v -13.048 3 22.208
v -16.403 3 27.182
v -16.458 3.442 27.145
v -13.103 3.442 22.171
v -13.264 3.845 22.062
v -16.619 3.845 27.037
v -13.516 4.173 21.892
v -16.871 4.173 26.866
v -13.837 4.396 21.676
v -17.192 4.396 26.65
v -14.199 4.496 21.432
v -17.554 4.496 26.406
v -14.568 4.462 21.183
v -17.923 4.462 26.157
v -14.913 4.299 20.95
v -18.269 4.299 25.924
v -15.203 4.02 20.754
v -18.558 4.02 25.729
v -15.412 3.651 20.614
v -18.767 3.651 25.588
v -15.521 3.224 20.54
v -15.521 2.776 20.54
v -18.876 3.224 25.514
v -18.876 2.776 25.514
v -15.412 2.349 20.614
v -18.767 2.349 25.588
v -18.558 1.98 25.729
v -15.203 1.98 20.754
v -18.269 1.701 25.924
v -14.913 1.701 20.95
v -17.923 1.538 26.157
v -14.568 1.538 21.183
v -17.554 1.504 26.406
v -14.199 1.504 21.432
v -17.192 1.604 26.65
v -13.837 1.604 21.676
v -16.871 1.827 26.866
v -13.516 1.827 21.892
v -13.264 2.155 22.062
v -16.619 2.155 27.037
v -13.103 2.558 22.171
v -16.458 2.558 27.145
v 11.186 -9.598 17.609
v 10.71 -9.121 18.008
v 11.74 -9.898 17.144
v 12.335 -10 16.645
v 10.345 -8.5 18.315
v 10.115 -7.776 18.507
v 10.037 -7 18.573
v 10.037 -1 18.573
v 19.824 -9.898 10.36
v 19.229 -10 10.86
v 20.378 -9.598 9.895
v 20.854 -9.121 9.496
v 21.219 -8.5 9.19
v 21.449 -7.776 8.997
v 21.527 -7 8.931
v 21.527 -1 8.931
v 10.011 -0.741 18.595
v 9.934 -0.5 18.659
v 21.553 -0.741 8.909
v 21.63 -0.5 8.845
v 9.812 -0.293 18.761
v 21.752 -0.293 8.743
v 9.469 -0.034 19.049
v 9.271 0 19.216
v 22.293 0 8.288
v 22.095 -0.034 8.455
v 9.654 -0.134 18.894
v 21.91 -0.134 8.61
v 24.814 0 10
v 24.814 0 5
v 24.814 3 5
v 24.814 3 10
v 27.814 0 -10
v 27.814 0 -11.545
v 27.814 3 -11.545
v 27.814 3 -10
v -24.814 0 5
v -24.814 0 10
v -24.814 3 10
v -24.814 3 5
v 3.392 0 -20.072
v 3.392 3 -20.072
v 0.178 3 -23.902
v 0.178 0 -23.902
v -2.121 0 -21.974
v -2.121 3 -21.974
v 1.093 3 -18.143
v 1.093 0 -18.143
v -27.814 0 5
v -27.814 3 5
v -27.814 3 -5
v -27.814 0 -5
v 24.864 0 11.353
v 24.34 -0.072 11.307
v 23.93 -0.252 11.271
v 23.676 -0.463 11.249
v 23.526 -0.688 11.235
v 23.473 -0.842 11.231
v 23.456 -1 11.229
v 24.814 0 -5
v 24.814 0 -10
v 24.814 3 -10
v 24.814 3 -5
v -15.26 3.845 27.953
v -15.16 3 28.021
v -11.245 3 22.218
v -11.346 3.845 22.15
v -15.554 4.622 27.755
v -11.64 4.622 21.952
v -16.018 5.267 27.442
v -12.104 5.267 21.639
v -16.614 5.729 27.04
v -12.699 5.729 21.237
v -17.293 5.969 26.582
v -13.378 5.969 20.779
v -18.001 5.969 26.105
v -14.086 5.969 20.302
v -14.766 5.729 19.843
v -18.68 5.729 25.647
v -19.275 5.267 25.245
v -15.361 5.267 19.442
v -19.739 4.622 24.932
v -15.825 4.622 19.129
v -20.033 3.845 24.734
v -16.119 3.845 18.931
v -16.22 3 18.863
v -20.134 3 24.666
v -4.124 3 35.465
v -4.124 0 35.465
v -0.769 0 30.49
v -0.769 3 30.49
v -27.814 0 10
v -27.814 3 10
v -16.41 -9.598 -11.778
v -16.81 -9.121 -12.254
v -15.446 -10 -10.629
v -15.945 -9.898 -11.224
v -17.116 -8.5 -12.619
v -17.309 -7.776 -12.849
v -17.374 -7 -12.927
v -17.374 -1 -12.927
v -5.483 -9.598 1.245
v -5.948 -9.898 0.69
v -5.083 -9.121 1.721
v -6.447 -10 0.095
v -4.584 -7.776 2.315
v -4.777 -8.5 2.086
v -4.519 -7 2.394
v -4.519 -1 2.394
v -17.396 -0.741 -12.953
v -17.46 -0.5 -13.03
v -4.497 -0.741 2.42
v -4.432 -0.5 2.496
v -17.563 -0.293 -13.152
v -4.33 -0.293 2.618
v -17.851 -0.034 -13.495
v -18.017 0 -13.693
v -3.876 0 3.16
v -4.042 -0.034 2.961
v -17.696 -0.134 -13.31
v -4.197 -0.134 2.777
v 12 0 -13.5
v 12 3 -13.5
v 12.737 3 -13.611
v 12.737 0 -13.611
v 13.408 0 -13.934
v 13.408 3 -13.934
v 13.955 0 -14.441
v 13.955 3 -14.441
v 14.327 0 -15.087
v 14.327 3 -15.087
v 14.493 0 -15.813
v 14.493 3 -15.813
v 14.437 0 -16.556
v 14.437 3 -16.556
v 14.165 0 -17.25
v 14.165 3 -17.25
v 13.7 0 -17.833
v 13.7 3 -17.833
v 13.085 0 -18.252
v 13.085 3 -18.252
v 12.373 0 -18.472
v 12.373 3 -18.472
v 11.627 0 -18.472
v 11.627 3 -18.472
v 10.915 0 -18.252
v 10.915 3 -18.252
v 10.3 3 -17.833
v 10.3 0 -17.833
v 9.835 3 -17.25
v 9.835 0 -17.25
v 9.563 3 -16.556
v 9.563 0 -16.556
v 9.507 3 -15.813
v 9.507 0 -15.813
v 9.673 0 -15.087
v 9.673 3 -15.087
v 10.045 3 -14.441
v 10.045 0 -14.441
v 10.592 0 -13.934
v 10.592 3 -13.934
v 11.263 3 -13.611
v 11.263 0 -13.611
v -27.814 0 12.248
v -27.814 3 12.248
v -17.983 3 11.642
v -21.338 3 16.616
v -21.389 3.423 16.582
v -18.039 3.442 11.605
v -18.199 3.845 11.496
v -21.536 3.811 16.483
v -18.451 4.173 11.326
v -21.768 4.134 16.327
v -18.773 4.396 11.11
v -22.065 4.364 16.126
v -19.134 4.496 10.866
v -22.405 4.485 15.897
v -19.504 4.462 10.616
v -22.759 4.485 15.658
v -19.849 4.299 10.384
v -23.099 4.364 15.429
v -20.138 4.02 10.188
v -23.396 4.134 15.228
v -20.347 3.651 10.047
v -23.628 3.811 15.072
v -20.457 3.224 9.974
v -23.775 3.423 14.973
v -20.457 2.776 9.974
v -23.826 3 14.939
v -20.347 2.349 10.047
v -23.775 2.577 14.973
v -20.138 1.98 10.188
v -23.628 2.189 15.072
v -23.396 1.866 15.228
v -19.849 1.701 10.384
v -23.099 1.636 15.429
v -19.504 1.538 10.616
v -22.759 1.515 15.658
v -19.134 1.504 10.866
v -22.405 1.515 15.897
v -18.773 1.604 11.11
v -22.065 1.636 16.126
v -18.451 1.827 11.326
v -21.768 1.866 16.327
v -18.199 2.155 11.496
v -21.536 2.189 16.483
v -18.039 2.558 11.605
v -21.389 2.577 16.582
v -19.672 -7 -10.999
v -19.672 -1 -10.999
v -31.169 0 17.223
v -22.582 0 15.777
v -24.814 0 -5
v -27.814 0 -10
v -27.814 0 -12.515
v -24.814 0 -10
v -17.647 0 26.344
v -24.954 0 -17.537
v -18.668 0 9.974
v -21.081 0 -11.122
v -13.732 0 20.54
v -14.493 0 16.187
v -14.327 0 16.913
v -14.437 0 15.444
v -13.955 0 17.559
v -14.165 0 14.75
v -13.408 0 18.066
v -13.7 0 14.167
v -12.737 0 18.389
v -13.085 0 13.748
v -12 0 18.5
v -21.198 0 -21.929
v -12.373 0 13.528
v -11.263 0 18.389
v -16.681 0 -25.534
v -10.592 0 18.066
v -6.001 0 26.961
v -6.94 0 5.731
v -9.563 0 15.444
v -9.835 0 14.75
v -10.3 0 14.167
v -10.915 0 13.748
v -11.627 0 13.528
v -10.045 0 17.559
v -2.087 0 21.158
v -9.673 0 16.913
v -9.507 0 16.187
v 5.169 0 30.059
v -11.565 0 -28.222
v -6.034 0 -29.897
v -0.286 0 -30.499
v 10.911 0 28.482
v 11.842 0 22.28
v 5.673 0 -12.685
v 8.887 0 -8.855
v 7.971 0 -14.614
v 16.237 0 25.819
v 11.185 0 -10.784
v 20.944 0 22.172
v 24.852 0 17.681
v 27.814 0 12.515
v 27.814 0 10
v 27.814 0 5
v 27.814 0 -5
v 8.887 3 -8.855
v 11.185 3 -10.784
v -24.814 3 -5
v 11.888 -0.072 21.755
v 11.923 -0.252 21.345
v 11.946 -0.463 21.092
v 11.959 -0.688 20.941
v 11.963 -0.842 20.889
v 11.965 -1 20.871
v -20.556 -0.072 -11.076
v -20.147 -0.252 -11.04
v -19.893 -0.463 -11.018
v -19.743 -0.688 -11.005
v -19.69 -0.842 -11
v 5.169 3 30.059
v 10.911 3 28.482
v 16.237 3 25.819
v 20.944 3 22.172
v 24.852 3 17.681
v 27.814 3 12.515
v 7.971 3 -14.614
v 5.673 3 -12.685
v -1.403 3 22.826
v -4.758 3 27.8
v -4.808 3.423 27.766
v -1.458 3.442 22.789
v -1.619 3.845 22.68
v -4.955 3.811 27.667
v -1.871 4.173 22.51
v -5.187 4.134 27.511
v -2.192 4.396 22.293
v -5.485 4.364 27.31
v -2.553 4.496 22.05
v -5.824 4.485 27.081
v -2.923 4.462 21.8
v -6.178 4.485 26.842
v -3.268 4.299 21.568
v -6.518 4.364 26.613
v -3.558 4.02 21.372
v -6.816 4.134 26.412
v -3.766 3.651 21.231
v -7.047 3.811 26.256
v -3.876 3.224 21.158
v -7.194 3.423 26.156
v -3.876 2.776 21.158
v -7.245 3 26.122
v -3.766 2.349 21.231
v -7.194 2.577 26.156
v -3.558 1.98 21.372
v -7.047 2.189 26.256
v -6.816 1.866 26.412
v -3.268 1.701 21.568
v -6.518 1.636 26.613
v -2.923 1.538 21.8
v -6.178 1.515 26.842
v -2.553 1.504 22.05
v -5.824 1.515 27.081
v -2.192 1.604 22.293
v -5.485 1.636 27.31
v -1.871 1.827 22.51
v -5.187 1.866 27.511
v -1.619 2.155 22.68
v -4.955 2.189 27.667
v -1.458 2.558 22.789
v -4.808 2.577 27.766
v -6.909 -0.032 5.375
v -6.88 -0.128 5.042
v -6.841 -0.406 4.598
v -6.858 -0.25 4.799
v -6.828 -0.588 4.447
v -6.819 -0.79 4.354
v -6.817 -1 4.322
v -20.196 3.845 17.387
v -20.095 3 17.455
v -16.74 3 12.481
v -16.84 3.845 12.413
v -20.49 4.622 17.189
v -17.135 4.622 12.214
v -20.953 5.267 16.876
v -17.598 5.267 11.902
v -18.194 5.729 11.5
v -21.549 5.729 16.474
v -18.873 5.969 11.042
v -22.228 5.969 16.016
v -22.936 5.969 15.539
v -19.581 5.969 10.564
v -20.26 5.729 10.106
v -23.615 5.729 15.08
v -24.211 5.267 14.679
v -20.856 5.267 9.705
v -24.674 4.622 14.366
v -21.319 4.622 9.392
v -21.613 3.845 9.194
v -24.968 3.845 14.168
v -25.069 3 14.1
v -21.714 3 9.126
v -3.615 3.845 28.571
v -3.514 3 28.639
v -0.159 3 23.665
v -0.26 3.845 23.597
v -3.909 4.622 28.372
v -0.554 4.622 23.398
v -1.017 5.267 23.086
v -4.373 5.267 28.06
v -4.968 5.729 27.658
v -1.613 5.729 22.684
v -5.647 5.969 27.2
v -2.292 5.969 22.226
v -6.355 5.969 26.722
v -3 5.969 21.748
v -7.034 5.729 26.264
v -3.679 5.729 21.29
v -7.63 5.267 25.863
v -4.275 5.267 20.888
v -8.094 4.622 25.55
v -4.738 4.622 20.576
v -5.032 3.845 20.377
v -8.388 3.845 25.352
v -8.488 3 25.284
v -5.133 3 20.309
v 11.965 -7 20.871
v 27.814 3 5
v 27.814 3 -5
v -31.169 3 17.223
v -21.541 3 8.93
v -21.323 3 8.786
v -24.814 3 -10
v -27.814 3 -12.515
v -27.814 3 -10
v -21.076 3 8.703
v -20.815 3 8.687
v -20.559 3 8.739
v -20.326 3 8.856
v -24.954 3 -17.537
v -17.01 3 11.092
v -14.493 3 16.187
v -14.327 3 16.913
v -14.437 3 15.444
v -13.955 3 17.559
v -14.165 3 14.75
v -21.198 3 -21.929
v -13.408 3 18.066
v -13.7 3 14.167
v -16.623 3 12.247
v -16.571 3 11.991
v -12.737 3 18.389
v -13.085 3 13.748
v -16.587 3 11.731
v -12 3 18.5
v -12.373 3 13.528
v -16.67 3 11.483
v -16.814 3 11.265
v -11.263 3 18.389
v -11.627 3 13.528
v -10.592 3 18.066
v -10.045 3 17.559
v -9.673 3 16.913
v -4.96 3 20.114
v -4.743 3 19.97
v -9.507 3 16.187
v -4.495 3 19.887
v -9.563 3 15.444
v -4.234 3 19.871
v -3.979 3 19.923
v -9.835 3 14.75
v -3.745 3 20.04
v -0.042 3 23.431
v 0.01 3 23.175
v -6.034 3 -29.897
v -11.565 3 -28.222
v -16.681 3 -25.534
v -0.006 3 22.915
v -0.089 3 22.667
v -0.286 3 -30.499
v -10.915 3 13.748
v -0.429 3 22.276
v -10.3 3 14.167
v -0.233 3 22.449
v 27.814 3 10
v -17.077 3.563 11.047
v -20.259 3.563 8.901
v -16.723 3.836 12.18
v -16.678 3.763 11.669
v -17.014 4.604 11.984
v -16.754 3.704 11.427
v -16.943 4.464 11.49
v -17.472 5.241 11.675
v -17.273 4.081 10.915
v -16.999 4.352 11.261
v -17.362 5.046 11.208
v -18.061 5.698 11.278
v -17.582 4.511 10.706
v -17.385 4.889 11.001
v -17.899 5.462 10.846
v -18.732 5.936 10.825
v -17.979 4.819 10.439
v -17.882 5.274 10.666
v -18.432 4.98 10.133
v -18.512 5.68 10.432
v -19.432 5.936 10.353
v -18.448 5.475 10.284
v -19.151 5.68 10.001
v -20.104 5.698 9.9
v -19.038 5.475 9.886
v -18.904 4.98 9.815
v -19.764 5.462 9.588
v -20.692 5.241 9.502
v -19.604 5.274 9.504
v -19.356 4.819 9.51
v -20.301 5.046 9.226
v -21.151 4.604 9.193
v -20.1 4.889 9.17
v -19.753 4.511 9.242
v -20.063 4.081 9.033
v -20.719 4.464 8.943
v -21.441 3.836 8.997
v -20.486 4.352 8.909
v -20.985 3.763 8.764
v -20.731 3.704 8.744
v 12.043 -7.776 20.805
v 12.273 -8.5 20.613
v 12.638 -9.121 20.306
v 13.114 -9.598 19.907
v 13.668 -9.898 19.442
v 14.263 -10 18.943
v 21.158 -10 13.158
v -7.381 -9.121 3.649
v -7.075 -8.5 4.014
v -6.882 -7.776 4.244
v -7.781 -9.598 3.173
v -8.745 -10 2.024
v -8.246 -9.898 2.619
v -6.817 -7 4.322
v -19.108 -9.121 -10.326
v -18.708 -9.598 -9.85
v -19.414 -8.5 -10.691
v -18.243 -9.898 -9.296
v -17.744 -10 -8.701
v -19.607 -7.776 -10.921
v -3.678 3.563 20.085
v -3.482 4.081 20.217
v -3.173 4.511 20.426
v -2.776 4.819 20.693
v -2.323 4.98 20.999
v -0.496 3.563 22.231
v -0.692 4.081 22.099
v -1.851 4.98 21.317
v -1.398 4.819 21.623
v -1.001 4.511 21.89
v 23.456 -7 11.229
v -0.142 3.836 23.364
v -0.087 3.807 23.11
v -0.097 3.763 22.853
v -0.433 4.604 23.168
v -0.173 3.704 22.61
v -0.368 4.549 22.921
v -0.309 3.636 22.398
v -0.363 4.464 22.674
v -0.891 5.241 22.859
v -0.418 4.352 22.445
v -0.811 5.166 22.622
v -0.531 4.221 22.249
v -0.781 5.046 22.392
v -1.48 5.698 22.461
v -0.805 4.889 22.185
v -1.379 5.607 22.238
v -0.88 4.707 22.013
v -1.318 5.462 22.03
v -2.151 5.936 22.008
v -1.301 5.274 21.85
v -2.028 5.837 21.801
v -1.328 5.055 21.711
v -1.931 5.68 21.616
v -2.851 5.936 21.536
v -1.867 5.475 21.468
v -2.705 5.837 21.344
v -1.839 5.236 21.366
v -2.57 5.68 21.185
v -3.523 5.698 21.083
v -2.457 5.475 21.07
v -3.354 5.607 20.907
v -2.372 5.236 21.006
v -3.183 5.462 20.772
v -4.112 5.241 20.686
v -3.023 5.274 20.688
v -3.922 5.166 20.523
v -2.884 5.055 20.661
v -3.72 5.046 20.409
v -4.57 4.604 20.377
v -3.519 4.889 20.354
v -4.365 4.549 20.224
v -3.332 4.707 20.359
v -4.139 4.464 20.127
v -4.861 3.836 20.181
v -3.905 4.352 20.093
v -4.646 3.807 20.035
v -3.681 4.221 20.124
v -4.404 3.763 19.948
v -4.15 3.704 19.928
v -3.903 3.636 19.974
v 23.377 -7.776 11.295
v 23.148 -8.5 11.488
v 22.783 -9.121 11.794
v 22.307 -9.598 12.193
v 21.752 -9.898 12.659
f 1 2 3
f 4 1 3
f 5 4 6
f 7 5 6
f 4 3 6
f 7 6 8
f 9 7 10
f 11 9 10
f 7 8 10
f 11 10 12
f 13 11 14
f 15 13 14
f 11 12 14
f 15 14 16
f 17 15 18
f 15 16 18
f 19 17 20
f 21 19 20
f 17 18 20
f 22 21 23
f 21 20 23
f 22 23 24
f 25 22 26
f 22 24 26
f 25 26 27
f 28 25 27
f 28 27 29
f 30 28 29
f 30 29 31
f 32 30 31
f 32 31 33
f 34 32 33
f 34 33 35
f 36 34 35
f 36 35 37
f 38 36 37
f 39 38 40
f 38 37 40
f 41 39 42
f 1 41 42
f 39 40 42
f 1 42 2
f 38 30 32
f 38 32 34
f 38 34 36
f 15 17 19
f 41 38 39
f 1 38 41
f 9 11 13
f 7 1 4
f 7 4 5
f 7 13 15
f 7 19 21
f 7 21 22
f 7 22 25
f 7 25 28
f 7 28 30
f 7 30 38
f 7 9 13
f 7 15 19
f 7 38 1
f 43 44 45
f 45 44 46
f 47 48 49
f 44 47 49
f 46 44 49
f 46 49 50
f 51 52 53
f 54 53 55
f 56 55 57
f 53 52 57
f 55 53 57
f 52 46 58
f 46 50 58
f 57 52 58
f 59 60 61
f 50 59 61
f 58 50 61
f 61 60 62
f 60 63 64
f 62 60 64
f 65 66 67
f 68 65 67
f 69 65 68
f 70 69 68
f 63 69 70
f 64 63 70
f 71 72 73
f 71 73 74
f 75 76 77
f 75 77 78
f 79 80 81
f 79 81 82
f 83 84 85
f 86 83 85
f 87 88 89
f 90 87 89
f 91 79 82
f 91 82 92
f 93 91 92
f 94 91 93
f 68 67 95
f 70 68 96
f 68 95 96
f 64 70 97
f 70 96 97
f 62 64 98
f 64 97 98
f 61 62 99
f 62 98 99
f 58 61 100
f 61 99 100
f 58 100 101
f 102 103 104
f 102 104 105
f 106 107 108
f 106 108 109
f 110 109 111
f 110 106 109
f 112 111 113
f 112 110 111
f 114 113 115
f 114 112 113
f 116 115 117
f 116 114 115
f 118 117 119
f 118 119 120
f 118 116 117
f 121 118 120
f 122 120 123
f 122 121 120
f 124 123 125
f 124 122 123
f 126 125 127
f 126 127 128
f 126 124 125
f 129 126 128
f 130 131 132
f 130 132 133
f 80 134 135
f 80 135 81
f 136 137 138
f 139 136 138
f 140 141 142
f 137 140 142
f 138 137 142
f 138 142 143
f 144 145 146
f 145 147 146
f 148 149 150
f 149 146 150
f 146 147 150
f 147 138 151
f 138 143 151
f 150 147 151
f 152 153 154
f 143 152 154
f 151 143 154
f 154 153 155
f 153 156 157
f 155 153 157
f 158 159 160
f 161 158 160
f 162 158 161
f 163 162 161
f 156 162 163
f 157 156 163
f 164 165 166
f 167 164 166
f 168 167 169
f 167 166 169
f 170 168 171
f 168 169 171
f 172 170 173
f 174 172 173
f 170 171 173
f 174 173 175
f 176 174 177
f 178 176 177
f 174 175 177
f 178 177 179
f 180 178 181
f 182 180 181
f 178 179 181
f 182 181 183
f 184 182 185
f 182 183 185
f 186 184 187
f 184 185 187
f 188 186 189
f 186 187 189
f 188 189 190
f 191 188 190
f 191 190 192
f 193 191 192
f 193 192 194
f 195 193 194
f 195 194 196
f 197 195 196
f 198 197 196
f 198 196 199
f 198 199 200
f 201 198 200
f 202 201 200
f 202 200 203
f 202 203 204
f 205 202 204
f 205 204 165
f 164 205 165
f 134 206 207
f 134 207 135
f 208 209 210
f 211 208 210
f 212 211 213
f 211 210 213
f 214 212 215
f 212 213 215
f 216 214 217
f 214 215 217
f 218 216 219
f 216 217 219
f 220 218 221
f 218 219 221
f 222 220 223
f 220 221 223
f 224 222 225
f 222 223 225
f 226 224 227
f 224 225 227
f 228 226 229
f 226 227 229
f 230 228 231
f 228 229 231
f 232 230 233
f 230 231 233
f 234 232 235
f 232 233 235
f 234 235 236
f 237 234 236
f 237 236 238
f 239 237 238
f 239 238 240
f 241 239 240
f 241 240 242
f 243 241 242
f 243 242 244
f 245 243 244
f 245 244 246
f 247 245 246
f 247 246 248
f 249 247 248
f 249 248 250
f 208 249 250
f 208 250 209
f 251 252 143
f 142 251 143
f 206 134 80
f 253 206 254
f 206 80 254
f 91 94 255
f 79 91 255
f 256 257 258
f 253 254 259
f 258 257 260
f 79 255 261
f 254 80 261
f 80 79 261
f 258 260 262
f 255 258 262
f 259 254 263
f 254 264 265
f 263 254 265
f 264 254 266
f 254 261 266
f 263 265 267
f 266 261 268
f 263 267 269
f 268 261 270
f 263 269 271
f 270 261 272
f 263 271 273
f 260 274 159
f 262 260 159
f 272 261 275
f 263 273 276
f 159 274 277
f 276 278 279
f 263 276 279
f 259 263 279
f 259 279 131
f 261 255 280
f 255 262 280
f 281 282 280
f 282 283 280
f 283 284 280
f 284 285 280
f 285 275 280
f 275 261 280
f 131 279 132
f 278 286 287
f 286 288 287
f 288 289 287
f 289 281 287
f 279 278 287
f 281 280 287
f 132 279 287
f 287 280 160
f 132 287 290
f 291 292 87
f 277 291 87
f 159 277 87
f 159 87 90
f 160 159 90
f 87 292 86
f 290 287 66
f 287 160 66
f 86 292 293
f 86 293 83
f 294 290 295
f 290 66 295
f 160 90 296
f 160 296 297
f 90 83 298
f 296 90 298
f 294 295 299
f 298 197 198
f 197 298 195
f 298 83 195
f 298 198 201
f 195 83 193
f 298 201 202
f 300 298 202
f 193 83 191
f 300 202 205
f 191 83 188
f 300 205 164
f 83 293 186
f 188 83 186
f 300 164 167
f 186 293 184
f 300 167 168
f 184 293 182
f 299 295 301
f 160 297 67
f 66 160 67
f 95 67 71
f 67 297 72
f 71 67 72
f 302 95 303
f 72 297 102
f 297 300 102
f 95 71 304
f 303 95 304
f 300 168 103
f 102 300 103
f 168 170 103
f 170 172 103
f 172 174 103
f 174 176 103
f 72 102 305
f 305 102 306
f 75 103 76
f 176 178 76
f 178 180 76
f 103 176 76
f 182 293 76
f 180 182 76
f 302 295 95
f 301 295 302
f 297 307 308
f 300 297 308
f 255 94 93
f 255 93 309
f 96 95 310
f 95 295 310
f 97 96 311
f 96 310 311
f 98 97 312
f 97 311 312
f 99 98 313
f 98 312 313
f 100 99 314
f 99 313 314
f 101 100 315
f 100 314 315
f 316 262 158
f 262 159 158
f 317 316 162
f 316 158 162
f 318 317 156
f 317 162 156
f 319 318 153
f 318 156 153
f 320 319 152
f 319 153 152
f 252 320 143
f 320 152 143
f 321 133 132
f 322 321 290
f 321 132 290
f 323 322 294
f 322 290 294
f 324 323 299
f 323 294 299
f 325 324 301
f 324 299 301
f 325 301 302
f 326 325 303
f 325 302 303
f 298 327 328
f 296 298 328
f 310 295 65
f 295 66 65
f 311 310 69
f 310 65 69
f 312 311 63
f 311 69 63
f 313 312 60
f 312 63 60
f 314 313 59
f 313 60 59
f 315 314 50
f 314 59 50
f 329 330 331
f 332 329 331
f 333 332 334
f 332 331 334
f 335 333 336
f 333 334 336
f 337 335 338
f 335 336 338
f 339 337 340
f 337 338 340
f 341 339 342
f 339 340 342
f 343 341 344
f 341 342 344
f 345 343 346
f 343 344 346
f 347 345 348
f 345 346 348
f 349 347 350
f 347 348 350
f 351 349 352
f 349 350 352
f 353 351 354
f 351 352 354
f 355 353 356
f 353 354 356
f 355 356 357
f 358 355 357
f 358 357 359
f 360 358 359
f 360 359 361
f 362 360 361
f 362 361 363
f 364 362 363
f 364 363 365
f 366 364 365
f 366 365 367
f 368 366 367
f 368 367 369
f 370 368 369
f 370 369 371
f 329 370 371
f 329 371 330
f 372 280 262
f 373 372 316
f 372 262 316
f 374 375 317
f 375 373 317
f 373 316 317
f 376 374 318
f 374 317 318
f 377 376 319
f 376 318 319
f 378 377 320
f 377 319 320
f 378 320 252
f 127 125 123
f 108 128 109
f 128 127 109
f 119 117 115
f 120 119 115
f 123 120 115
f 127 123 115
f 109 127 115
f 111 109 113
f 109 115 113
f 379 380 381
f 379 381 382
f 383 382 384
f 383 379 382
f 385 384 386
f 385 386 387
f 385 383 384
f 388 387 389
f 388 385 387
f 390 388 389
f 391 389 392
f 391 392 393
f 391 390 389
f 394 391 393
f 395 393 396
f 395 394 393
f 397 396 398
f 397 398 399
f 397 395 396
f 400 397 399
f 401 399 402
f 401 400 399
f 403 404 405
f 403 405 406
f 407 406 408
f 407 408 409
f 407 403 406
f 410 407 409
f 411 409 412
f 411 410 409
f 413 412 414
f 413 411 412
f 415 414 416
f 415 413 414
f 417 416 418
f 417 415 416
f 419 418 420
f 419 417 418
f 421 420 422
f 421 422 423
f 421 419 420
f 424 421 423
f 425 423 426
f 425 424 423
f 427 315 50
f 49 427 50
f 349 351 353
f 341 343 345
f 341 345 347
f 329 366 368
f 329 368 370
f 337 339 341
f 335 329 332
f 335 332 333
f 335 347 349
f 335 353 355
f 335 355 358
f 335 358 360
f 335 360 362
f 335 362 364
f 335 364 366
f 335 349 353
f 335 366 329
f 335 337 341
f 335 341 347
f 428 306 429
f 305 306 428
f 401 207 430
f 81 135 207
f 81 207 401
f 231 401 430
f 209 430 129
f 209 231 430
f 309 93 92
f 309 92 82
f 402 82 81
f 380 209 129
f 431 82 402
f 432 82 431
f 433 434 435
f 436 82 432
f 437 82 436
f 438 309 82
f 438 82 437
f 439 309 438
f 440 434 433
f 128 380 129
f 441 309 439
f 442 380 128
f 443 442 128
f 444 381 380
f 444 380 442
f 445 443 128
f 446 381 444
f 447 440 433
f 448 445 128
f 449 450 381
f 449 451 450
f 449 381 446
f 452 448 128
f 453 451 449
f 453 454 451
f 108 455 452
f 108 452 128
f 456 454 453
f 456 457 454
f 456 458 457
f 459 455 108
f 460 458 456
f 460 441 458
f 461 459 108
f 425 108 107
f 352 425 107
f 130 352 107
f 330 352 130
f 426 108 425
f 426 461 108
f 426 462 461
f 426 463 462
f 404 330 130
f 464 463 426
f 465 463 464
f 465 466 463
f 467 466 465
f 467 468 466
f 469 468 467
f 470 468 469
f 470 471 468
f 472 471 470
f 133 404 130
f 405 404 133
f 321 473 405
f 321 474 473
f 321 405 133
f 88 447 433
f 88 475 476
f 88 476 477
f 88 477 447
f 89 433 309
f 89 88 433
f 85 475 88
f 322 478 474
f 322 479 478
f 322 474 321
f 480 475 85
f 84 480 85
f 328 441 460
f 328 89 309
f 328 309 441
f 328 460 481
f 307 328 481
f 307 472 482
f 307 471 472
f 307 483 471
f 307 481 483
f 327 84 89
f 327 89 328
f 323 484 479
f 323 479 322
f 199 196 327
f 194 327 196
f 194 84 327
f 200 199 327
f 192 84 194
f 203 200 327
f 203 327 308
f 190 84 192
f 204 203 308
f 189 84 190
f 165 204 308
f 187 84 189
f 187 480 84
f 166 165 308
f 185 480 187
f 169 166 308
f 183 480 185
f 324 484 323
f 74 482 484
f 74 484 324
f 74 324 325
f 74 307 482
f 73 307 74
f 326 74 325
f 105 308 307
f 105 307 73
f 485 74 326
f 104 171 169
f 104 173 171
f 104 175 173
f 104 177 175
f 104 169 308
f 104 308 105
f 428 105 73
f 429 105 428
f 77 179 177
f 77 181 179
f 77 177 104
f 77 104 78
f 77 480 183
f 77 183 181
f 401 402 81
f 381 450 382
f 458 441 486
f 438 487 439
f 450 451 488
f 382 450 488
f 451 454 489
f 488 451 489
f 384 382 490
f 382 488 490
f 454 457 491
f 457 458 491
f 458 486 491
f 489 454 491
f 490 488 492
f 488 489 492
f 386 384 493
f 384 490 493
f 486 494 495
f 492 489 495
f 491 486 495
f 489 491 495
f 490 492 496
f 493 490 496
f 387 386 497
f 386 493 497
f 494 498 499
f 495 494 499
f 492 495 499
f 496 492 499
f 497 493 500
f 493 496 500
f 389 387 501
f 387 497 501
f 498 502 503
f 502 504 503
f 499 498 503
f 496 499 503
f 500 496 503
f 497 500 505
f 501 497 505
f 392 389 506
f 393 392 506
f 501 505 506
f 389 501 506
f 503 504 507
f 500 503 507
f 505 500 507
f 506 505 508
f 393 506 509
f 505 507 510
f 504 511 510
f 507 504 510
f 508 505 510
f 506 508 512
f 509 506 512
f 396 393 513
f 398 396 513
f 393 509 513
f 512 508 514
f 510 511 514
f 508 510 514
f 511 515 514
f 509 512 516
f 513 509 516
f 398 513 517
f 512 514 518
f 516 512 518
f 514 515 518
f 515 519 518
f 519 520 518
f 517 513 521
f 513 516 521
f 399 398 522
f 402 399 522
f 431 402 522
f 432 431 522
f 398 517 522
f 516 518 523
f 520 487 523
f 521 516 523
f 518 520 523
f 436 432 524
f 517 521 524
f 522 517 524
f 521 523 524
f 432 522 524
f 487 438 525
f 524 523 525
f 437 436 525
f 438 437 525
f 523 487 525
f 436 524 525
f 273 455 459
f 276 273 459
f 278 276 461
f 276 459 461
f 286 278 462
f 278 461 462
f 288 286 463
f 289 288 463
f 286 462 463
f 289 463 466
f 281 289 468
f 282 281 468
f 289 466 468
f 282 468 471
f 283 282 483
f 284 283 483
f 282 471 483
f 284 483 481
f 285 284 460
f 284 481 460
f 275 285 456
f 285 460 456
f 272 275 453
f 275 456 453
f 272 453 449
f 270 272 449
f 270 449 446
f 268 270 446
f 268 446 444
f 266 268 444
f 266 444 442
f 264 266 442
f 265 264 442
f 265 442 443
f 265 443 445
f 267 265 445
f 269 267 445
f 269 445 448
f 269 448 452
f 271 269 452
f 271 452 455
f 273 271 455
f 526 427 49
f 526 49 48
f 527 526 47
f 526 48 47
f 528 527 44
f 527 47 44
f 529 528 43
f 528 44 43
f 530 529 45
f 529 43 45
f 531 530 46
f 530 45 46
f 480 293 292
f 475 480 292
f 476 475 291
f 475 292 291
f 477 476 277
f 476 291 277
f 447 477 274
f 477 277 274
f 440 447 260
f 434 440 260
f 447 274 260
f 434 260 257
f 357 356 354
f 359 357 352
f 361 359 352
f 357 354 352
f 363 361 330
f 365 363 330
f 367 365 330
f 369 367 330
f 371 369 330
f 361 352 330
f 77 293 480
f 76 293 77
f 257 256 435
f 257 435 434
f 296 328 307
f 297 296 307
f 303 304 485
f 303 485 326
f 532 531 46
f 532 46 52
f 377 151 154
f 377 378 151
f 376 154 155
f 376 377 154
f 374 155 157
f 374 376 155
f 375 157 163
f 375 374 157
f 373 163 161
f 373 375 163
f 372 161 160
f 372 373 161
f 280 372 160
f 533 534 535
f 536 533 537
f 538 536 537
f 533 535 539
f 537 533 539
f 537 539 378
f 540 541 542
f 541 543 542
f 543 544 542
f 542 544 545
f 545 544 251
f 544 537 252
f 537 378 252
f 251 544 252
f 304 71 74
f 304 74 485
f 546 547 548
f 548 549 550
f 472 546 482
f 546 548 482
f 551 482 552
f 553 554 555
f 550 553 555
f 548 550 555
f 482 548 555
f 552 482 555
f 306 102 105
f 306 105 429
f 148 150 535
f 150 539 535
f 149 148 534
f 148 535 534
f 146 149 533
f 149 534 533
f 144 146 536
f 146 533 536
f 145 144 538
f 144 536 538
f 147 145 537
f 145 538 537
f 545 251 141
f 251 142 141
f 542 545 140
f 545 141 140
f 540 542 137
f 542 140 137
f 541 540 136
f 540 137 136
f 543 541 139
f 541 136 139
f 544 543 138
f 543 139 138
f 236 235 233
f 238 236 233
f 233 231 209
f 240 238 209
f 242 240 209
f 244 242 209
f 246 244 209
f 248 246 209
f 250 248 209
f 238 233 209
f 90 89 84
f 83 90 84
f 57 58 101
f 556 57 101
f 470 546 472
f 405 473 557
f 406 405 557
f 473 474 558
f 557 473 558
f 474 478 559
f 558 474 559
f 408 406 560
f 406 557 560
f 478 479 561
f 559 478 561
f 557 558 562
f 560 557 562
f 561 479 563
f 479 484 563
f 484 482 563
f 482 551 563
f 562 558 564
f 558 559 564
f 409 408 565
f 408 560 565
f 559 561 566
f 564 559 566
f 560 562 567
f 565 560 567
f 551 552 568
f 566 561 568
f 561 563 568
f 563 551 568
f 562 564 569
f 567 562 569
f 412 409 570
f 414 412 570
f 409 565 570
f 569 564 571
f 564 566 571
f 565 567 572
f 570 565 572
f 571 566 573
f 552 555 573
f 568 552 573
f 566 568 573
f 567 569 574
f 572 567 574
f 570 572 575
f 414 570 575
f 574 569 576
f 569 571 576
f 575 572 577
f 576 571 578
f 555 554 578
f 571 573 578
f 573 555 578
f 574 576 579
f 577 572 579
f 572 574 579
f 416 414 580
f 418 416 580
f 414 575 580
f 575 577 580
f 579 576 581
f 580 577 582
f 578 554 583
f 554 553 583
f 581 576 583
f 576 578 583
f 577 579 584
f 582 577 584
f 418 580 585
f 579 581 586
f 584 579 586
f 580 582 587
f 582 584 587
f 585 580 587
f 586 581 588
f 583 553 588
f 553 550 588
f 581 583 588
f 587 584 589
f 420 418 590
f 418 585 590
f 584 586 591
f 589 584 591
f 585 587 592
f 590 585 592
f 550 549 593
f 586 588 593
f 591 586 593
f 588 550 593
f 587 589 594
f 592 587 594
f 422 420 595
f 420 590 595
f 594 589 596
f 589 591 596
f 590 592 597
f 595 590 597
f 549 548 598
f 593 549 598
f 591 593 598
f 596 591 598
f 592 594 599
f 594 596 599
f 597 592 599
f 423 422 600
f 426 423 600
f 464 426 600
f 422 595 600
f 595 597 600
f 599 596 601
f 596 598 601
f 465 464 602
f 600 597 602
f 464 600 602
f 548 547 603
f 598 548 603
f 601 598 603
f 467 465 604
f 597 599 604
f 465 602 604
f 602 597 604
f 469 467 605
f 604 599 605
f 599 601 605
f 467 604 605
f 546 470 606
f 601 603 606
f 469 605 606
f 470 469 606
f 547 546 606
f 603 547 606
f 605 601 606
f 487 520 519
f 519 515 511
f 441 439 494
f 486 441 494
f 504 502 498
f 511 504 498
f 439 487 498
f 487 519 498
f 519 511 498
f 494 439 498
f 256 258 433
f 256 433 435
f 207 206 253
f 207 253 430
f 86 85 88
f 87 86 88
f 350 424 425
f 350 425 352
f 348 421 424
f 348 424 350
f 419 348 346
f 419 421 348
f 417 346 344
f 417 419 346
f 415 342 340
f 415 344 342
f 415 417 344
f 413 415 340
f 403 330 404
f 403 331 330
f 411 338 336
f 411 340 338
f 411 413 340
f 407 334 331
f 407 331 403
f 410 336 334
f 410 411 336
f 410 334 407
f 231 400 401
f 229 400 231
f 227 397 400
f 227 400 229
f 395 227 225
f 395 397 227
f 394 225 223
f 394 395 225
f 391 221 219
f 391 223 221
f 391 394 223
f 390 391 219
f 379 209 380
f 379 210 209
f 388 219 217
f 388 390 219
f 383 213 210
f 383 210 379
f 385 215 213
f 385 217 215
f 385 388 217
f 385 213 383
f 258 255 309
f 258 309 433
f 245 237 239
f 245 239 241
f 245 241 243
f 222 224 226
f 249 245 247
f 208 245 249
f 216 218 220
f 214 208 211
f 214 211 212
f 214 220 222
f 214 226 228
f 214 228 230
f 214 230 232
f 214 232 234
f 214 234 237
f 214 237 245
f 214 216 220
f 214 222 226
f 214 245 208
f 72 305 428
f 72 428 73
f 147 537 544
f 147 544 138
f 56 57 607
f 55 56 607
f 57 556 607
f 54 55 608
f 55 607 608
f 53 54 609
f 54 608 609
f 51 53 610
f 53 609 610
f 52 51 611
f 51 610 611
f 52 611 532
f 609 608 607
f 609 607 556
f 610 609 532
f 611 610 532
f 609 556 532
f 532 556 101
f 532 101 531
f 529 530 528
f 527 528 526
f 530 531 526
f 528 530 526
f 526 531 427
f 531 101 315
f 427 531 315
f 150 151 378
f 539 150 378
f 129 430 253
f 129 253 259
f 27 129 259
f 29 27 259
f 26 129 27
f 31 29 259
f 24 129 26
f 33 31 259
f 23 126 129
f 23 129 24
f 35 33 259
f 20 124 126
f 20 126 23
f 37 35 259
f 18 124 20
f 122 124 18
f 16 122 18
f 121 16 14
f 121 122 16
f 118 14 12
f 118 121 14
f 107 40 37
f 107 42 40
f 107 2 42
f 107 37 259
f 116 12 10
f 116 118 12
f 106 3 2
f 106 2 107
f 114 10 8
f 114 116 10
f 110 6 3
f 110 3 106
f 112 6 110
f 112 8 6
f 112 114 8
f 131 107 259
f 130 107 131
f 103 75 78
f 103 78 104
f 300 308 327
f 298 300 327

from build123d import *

# Parameters (mm, degrees)
CROQUIS1_R              = 30.5
SALIENTE_EXTRUIR1_DEPTH = 3
CORTAR_EXTRUIR3_START   = -4
CORTAR_EXTRUIR3_DEPTH   = 4
CORTAR_EXTRUIR6_DEPTH   = 10
CROQUIS10_R             = 2.5
CORTAR_EXTRUIR7_DEPTH   = 10
CORTAR_EXTRUIR8_START   = -3
CORTAR_EXTRUIR8_DEPTH   = 3
SALIENTE_EXTRUIR2_DEPTH = 10
REDONDEO1_R             = 3
REDONDEO2_R             = 1
CORTAR_EXTRUIR9_START   = -3
CORTAR_EXTRUIR9_DEPTH   = 3
CORTAR_EXTRUIR10_START  = -10
CORTAR_EXTRUIR10_DEPTH  = 10
CROQUIS19_R             = 3
SALIENTE_EXTRUIR5_DEPTH = 7
CROQUIS20_R             = 1.5
CORTAR_EXTRUIR12_DEPTH  = 6
REDONDEO3_R             = 1
CROQUIS16_W             = 32.622025527
CROQUIS16_H             = 3
SALIENTE_EXTRUIR3_DEPTH = 6
CROQUIS17_R             = 3
SALIENTE_EXTRUIR4_DEPTH = 7
CROQUIS18_R             = 1.5
CORTAR_EXTRUIR11_DEPTH  = 6


with BuildPart() as part:
    # Croquis1 → Saliente-Extruir1 (new body)
    with BuildSketch(Plane(origin=(0, 0, 0), x_dir=(1, 0, 0), z_dir=(0, 1, 0))):
        with Locations(Location((0, 0, 0), (0, 0, 270))):
            Circle(CROQUIS1_R)
    extrude(amount=SALIENTE_EXTRUIR1_DEPTH)

    # Croquis5 → Cortar-Extruir3 (cut)
    with BuildSketch(Plane(origin=(0, 3, 0), x_dir=(1, 0, 0), z_dir=(0, 1, 0)).offset(CORTAR_EXTRUIR3_START)):
        with BuildLine():
            Line((28.814059068, 5), (30.087372767, 5))
            ThreePointArc((30.087372767, 5), (29.556634924, 7.526973624), (28.814059068, 10))
            Line((28.814059068, 10), (24.814059068, 10))
            Line((24.814059068, 10), (24.814059068, 5))
            Line((24.814059068, 5), (28.814059068, 5))
        make_face()
        with BuildLine():
            Line((30.087372767, -5), (28.814059068, -5))
            Line((28.814059068, -5), (24.814059068, -5))
            Line((24.814059068, -5), (24.814059068, -10))
            Line((24.814059068, -10), (28.814059068, -10))
            ThreePointArc((28.814059068, -10), (29.556634924, -7.526973624), (30.087372767, -5))
        make_face()
        with BuildLine():
            Line((-24.814059068, 5), (-24.814059068, 10))
            Line((-24.814059068, 10), (-28.814059068, 10))
            ThreePointArc((-28.814059068, 10), (-29.556634924, 7.526973624), (-30.087372767, 5))
            Line((-30.087372767, 5), (-28.814059068, 5))
            Line((-28.814059068, 5), (-24.814059068, 5))
        make_face()
        with BuildLine():
            Line((-28.814059068, -10), (-24.814059068, -10))
            Line((-24.814059068, -10), (-24.814059068, -5))
            Line((-24.814059068, -5), (-28.814059068, -5))
            Line((-28.814059068, -5), (-30.087372767, -5))
            ThreePointArc((-30.087372767, -5), (-29.556634924, -7.526973624), (-28.814059068, -10))
        make_face()
    extrude(amount=CORTAR_EXTRUIR3_DEPTH, mode=Mode.SUBTRACT)

    # Croquis9 → Cortar-Extruir6 (cut)
    with BuildSketch(Plane(origin=(0, 3, 0), x_dir=(1, 0, 0), z_dir=(0, 1, 0))):
        Polygon((5.673284852, 12.685390231), (8.887222901, 8.855168016), (11.18535623, 10.783530845), (7.971418181, 14.613753061), align=None)
        Polygon((-2.120514915, 21.973679104), (1.093423133, 18.143456889), (3.391556462, 20.071819718), (0.177618414, 23.902041933), align=None)
    extrude(amount=-CORTAR_EXTRUIR6_DEPTH, mode=Mode.SUBTRACT)

    # Croquis10 → Cortar-Extruir7 (cut)
    with BuildSketch(Plane(origin=(0, 3, 0), x_dir=(1, 0, 0), z_dir=(0, 1, 0))):
        with Locations(Location((12, 16, 0), (0, 0, 270))):
            Circle(CROQUIS10_R)
        with Locations(Location((-12, -16, 0), (0, 0, 270))):
            Circle(CROQUIS10_R)
    extrude(amount=-CORTAR_EXTRUIR7_DEPTH, mode=Mode.SUBTRACT)

    # Croquis11 → Cortar-Extruir8 (cut)
    with BuildSketch(Plane(origin=(0, 3, 0), x_dir=(1, 0, 0), z_dir=(0, 1, 0)).offset(CORTAR_EXTRUIR8_START)):
        with BuildLine():
            ThreePointArc((-28.814059068, -10), (-28.341972277, -11.268655974), (-27.814059068, -12.515115586))
            Line((-27.814059068, -12.515115586), (-27.814059068, -10))
            Line((-27.814059068, -10), (-28.814059068, -10))
        make_face()
        with BuildLine():
            Line((-27.814059068, -5), (-27.814059068, 5))
            Line((-27.814059068, 5), (-30.087372767, 5))
            ThreePointArc((-30.087372767, 5), (-30.5, 0), (-30.087372767, -5))
            Line((-30.087372767, -5), (-27.814059068, -5))
        make_face()
        with BuildLine():
            Line((-27.814059068, 10), (-27.814059068, 12.515115586))
            ThreePointArc((-27.814059068, 12.515115586), (-28.341972277, 11.268655974), (-28.814059068, 10))
            Line((-28.814059068, 10), (-27.814059068, 10))
        make_face()
        with BuildLine():
            Line((28.814059068, -10), (27.814059068, -10))
            Line((27.814059068, -10), (27.814059068, -12.515115586))
            ThreePointArc((27.814059068, -12.515115586), (28.341972277, -11.268655974), (28.814059068, -10))
        make_face()
        with BuildLine():
            Line((30.087372767, 5), (27.814059068, 5))
            Line((27.814059068, 5), (27.814059068, -5))
            Line((27.814059068, -5), (30.087372767, -5))
            ThreePointArc((30.087372767, -5), (30.5, 0), (30.087372767, 5))
        make_face()
        with BuildLine():
            Line((27.814059068, 12.515115586), (27.814059068, 10))
            Line((27.814059068, 10), (28.814059068, 10))
            ThreePointArc((28.814059068, 10), (28.341972277, 11.268655974), (27.814059068, 12.515115586))
        make_face()
    extrude(amount=CORTAR_EXTRUIR8_DEPTH, mode=Mode.SUBTRACT)

    # Croquis13 → Saliente-Extruir2 (add)
    with BuildSketch(Plane.XZ):
        Polygon((-6.816688183, 4.321977983), (-19.672440377, -10.99891088), (-17.374307048, -12.927273709), (-4.518554854, 2.393615154), align=None)
        Polygon((21.527275636, 8.931176939), (23.455638465, 11.229310268), (11.964971818, 20.871124414), (10.036608989, 18.572991084), align=None)
    extrude(amount=SALIENTE_EXTRUIR2_DEPTH)

    # Redondeo1
    redondeo1_edges = [part.edges().sort_by_distance(p)[0] for p in [
        (-5.667621519, -10, 3.357796568),
        (-18.523373712, -10, -11.963092294),
        (22.49145705, -10, 10.080243604),
        (11.000790403, -10, 19.722057749),
    ]]
    fillet(redondeo1_edges, radius=REDONDEO1_R)

    # Redondeo2
    redondeo2_edges = [part.edges().sort_by_distance(p)[0] for p in [
        (-5.667621519, 0, 3.357796568),
        (-13.24456428, 0, -3.338466449),
        (-18.523373712, 0, -11.963092294),
        (22.49145705, 0, 10.080243604),
        (17.710305141, 0, 16.050217341),
        (11.000790403, 0, 19.722057749),
    ]]
    fillet(redondeo2_edges, radius=REDONDEO2_R)

    # Croquis14 → Cortar-Extruir9 (cut)
    with BuildSketch(Plane(origin=(0, 3, 0), x_dir=(1, 0, 0), z_dir=(0, 1, 0)).offset(CORTAR_EXTRUIR9_START)):
        with BuildLine():
            Line((-0.28585192, 30.498660441), (27.814059068, 11.545031156))
            Line((27.814059068, 11.545031156), (27.814059068, 12.515115586))
            ThreePointArc((27.814059068, 12.515115586), (16.440879495, 25.689442995), (-0.28585192, 30.498660441))
        make_face()
    extrude(amount=CORTAR_EXTRUIR9_DEPTH, mode=Mode.SUBTRACT)

    # Croquis15 → Cortar-Extruir10 (cut)
    with BuildSketch(Plane(origin=(0, 3, 0), x_dir=(1, 0, 0), z_dir=(0, 1, 0)).offset(CORTAR_EXTRUIR10_START)):
        with BuildLine():
            Line((-27.814059068, -12.24829445), (-27.814059068, -12.515115586))
            ThreePointArc((-27.814059068, -12.515115586), (-16.882746118, -25.401237834), (-0.769174213, -30.490299622))
            Line((-0.769174213, -30.490299622), (-27.814059068, -12.24829445))
        make_face()
    extrude(amount=CORTAR_EXTRUIR10_DEPTH, mode=Mode.SUBTRACT)

    # Croquis19 → Saliente-Extruir5 (add)
    with BuildSketch(Plane(origin=(-14.375575006, 0, 21.312666404), x_dir=(0.8290375725550415, 0, 0.5591929034707471), z_dir=(-0.5591929034707471, 0, 0.8290375725550415))):
        with Locations((10.101272087, 3)):
            Circle(CROQUIS19_R)
        with Locations((-9.898727913, 3)):
            Circle(CROQUIS19_R)
    extrude(amount=-SALIENTE_EXTRUIR5_DEPTH)

    # Croquis20 → Cortar-Extruir12 (cut)
    with BuildSketch(Plane(origin=(-14.375575006, 0, 21.312666404), x_dir=(0.8290375725550415, 0, 0.5591929034707471), z_dir=(-0.5591929034707471, 0, 0.8290375725550415))):
        with Locations((10.101272087, 3)):
            Circle(CROQUIS20_R)
        with Locations((-9.898727913, 3)):
            Circle(CROQUIS20_R)
    extrude(amount=-CORTAR_EXTRUIR12_DEPTH, mode=Mode.SUBTRACT)

    # Redondeo3
    redondeo3_edges = [part.edges().sort_by_distance(p)[0] for p in [
        (-2.086890591, 6, 21.157963063),
        (-18.667642042, 6, 9.974104993),
    ]]
    fillet(redondeo3_edges, radius=REDONDEO3_R)

    # Croquis16 → Saliente-Extruir3 (add)
    with BuildSketch(Plane(origin=(-14.375575006, 0, 21.312666404), x_dir=(0.8290375725550415, 0, 0.5591929034707471), z_dir=(-0.5591929034707471, 0, 0.8290375725550415))):
        with Locations((0.101272086, 1.5)):
            Rectangle(CROQUIS16_W, CROQUIS16_H)
    extrude(amount=SALIENTE_EXTRUIR3_DEPTH)

    # Croquis17 → Saliente-Extruir4 (add)
    with BuildSketch(Plane(origin=(-17.730732427, 0, 26.286891839), x_dir=(0.8290375725550415, 0, 0.5591929034707471), z_dir=(-0.5591929034707471, 0, 0.8290375725550415))):
        with Locations((0.101272087, 3)):
            Circle(CROQUIS17_R)
    extrude(amount=-SALIENTE_EXTRUIR4_DEPTH)

    # Croquis18 → Cortar-Extruir11 (cut)
    with BuildSketch(Plane(origin=(-17.730732427, 0, 26.286891839), x_dir=(0.8290375725550415, 0, 0.5591929034707471), z_dir=(-0.5591929034707471, 0, 0.8290375725550415))):
        with Locations((0.101272087, 3)):
            Circle(CROQUIS18_R)
    extrude(amount=-CORTAR_EXTRUIR11_DEPTH, mode=Mode.SUBTRACT)


solid = part.part
